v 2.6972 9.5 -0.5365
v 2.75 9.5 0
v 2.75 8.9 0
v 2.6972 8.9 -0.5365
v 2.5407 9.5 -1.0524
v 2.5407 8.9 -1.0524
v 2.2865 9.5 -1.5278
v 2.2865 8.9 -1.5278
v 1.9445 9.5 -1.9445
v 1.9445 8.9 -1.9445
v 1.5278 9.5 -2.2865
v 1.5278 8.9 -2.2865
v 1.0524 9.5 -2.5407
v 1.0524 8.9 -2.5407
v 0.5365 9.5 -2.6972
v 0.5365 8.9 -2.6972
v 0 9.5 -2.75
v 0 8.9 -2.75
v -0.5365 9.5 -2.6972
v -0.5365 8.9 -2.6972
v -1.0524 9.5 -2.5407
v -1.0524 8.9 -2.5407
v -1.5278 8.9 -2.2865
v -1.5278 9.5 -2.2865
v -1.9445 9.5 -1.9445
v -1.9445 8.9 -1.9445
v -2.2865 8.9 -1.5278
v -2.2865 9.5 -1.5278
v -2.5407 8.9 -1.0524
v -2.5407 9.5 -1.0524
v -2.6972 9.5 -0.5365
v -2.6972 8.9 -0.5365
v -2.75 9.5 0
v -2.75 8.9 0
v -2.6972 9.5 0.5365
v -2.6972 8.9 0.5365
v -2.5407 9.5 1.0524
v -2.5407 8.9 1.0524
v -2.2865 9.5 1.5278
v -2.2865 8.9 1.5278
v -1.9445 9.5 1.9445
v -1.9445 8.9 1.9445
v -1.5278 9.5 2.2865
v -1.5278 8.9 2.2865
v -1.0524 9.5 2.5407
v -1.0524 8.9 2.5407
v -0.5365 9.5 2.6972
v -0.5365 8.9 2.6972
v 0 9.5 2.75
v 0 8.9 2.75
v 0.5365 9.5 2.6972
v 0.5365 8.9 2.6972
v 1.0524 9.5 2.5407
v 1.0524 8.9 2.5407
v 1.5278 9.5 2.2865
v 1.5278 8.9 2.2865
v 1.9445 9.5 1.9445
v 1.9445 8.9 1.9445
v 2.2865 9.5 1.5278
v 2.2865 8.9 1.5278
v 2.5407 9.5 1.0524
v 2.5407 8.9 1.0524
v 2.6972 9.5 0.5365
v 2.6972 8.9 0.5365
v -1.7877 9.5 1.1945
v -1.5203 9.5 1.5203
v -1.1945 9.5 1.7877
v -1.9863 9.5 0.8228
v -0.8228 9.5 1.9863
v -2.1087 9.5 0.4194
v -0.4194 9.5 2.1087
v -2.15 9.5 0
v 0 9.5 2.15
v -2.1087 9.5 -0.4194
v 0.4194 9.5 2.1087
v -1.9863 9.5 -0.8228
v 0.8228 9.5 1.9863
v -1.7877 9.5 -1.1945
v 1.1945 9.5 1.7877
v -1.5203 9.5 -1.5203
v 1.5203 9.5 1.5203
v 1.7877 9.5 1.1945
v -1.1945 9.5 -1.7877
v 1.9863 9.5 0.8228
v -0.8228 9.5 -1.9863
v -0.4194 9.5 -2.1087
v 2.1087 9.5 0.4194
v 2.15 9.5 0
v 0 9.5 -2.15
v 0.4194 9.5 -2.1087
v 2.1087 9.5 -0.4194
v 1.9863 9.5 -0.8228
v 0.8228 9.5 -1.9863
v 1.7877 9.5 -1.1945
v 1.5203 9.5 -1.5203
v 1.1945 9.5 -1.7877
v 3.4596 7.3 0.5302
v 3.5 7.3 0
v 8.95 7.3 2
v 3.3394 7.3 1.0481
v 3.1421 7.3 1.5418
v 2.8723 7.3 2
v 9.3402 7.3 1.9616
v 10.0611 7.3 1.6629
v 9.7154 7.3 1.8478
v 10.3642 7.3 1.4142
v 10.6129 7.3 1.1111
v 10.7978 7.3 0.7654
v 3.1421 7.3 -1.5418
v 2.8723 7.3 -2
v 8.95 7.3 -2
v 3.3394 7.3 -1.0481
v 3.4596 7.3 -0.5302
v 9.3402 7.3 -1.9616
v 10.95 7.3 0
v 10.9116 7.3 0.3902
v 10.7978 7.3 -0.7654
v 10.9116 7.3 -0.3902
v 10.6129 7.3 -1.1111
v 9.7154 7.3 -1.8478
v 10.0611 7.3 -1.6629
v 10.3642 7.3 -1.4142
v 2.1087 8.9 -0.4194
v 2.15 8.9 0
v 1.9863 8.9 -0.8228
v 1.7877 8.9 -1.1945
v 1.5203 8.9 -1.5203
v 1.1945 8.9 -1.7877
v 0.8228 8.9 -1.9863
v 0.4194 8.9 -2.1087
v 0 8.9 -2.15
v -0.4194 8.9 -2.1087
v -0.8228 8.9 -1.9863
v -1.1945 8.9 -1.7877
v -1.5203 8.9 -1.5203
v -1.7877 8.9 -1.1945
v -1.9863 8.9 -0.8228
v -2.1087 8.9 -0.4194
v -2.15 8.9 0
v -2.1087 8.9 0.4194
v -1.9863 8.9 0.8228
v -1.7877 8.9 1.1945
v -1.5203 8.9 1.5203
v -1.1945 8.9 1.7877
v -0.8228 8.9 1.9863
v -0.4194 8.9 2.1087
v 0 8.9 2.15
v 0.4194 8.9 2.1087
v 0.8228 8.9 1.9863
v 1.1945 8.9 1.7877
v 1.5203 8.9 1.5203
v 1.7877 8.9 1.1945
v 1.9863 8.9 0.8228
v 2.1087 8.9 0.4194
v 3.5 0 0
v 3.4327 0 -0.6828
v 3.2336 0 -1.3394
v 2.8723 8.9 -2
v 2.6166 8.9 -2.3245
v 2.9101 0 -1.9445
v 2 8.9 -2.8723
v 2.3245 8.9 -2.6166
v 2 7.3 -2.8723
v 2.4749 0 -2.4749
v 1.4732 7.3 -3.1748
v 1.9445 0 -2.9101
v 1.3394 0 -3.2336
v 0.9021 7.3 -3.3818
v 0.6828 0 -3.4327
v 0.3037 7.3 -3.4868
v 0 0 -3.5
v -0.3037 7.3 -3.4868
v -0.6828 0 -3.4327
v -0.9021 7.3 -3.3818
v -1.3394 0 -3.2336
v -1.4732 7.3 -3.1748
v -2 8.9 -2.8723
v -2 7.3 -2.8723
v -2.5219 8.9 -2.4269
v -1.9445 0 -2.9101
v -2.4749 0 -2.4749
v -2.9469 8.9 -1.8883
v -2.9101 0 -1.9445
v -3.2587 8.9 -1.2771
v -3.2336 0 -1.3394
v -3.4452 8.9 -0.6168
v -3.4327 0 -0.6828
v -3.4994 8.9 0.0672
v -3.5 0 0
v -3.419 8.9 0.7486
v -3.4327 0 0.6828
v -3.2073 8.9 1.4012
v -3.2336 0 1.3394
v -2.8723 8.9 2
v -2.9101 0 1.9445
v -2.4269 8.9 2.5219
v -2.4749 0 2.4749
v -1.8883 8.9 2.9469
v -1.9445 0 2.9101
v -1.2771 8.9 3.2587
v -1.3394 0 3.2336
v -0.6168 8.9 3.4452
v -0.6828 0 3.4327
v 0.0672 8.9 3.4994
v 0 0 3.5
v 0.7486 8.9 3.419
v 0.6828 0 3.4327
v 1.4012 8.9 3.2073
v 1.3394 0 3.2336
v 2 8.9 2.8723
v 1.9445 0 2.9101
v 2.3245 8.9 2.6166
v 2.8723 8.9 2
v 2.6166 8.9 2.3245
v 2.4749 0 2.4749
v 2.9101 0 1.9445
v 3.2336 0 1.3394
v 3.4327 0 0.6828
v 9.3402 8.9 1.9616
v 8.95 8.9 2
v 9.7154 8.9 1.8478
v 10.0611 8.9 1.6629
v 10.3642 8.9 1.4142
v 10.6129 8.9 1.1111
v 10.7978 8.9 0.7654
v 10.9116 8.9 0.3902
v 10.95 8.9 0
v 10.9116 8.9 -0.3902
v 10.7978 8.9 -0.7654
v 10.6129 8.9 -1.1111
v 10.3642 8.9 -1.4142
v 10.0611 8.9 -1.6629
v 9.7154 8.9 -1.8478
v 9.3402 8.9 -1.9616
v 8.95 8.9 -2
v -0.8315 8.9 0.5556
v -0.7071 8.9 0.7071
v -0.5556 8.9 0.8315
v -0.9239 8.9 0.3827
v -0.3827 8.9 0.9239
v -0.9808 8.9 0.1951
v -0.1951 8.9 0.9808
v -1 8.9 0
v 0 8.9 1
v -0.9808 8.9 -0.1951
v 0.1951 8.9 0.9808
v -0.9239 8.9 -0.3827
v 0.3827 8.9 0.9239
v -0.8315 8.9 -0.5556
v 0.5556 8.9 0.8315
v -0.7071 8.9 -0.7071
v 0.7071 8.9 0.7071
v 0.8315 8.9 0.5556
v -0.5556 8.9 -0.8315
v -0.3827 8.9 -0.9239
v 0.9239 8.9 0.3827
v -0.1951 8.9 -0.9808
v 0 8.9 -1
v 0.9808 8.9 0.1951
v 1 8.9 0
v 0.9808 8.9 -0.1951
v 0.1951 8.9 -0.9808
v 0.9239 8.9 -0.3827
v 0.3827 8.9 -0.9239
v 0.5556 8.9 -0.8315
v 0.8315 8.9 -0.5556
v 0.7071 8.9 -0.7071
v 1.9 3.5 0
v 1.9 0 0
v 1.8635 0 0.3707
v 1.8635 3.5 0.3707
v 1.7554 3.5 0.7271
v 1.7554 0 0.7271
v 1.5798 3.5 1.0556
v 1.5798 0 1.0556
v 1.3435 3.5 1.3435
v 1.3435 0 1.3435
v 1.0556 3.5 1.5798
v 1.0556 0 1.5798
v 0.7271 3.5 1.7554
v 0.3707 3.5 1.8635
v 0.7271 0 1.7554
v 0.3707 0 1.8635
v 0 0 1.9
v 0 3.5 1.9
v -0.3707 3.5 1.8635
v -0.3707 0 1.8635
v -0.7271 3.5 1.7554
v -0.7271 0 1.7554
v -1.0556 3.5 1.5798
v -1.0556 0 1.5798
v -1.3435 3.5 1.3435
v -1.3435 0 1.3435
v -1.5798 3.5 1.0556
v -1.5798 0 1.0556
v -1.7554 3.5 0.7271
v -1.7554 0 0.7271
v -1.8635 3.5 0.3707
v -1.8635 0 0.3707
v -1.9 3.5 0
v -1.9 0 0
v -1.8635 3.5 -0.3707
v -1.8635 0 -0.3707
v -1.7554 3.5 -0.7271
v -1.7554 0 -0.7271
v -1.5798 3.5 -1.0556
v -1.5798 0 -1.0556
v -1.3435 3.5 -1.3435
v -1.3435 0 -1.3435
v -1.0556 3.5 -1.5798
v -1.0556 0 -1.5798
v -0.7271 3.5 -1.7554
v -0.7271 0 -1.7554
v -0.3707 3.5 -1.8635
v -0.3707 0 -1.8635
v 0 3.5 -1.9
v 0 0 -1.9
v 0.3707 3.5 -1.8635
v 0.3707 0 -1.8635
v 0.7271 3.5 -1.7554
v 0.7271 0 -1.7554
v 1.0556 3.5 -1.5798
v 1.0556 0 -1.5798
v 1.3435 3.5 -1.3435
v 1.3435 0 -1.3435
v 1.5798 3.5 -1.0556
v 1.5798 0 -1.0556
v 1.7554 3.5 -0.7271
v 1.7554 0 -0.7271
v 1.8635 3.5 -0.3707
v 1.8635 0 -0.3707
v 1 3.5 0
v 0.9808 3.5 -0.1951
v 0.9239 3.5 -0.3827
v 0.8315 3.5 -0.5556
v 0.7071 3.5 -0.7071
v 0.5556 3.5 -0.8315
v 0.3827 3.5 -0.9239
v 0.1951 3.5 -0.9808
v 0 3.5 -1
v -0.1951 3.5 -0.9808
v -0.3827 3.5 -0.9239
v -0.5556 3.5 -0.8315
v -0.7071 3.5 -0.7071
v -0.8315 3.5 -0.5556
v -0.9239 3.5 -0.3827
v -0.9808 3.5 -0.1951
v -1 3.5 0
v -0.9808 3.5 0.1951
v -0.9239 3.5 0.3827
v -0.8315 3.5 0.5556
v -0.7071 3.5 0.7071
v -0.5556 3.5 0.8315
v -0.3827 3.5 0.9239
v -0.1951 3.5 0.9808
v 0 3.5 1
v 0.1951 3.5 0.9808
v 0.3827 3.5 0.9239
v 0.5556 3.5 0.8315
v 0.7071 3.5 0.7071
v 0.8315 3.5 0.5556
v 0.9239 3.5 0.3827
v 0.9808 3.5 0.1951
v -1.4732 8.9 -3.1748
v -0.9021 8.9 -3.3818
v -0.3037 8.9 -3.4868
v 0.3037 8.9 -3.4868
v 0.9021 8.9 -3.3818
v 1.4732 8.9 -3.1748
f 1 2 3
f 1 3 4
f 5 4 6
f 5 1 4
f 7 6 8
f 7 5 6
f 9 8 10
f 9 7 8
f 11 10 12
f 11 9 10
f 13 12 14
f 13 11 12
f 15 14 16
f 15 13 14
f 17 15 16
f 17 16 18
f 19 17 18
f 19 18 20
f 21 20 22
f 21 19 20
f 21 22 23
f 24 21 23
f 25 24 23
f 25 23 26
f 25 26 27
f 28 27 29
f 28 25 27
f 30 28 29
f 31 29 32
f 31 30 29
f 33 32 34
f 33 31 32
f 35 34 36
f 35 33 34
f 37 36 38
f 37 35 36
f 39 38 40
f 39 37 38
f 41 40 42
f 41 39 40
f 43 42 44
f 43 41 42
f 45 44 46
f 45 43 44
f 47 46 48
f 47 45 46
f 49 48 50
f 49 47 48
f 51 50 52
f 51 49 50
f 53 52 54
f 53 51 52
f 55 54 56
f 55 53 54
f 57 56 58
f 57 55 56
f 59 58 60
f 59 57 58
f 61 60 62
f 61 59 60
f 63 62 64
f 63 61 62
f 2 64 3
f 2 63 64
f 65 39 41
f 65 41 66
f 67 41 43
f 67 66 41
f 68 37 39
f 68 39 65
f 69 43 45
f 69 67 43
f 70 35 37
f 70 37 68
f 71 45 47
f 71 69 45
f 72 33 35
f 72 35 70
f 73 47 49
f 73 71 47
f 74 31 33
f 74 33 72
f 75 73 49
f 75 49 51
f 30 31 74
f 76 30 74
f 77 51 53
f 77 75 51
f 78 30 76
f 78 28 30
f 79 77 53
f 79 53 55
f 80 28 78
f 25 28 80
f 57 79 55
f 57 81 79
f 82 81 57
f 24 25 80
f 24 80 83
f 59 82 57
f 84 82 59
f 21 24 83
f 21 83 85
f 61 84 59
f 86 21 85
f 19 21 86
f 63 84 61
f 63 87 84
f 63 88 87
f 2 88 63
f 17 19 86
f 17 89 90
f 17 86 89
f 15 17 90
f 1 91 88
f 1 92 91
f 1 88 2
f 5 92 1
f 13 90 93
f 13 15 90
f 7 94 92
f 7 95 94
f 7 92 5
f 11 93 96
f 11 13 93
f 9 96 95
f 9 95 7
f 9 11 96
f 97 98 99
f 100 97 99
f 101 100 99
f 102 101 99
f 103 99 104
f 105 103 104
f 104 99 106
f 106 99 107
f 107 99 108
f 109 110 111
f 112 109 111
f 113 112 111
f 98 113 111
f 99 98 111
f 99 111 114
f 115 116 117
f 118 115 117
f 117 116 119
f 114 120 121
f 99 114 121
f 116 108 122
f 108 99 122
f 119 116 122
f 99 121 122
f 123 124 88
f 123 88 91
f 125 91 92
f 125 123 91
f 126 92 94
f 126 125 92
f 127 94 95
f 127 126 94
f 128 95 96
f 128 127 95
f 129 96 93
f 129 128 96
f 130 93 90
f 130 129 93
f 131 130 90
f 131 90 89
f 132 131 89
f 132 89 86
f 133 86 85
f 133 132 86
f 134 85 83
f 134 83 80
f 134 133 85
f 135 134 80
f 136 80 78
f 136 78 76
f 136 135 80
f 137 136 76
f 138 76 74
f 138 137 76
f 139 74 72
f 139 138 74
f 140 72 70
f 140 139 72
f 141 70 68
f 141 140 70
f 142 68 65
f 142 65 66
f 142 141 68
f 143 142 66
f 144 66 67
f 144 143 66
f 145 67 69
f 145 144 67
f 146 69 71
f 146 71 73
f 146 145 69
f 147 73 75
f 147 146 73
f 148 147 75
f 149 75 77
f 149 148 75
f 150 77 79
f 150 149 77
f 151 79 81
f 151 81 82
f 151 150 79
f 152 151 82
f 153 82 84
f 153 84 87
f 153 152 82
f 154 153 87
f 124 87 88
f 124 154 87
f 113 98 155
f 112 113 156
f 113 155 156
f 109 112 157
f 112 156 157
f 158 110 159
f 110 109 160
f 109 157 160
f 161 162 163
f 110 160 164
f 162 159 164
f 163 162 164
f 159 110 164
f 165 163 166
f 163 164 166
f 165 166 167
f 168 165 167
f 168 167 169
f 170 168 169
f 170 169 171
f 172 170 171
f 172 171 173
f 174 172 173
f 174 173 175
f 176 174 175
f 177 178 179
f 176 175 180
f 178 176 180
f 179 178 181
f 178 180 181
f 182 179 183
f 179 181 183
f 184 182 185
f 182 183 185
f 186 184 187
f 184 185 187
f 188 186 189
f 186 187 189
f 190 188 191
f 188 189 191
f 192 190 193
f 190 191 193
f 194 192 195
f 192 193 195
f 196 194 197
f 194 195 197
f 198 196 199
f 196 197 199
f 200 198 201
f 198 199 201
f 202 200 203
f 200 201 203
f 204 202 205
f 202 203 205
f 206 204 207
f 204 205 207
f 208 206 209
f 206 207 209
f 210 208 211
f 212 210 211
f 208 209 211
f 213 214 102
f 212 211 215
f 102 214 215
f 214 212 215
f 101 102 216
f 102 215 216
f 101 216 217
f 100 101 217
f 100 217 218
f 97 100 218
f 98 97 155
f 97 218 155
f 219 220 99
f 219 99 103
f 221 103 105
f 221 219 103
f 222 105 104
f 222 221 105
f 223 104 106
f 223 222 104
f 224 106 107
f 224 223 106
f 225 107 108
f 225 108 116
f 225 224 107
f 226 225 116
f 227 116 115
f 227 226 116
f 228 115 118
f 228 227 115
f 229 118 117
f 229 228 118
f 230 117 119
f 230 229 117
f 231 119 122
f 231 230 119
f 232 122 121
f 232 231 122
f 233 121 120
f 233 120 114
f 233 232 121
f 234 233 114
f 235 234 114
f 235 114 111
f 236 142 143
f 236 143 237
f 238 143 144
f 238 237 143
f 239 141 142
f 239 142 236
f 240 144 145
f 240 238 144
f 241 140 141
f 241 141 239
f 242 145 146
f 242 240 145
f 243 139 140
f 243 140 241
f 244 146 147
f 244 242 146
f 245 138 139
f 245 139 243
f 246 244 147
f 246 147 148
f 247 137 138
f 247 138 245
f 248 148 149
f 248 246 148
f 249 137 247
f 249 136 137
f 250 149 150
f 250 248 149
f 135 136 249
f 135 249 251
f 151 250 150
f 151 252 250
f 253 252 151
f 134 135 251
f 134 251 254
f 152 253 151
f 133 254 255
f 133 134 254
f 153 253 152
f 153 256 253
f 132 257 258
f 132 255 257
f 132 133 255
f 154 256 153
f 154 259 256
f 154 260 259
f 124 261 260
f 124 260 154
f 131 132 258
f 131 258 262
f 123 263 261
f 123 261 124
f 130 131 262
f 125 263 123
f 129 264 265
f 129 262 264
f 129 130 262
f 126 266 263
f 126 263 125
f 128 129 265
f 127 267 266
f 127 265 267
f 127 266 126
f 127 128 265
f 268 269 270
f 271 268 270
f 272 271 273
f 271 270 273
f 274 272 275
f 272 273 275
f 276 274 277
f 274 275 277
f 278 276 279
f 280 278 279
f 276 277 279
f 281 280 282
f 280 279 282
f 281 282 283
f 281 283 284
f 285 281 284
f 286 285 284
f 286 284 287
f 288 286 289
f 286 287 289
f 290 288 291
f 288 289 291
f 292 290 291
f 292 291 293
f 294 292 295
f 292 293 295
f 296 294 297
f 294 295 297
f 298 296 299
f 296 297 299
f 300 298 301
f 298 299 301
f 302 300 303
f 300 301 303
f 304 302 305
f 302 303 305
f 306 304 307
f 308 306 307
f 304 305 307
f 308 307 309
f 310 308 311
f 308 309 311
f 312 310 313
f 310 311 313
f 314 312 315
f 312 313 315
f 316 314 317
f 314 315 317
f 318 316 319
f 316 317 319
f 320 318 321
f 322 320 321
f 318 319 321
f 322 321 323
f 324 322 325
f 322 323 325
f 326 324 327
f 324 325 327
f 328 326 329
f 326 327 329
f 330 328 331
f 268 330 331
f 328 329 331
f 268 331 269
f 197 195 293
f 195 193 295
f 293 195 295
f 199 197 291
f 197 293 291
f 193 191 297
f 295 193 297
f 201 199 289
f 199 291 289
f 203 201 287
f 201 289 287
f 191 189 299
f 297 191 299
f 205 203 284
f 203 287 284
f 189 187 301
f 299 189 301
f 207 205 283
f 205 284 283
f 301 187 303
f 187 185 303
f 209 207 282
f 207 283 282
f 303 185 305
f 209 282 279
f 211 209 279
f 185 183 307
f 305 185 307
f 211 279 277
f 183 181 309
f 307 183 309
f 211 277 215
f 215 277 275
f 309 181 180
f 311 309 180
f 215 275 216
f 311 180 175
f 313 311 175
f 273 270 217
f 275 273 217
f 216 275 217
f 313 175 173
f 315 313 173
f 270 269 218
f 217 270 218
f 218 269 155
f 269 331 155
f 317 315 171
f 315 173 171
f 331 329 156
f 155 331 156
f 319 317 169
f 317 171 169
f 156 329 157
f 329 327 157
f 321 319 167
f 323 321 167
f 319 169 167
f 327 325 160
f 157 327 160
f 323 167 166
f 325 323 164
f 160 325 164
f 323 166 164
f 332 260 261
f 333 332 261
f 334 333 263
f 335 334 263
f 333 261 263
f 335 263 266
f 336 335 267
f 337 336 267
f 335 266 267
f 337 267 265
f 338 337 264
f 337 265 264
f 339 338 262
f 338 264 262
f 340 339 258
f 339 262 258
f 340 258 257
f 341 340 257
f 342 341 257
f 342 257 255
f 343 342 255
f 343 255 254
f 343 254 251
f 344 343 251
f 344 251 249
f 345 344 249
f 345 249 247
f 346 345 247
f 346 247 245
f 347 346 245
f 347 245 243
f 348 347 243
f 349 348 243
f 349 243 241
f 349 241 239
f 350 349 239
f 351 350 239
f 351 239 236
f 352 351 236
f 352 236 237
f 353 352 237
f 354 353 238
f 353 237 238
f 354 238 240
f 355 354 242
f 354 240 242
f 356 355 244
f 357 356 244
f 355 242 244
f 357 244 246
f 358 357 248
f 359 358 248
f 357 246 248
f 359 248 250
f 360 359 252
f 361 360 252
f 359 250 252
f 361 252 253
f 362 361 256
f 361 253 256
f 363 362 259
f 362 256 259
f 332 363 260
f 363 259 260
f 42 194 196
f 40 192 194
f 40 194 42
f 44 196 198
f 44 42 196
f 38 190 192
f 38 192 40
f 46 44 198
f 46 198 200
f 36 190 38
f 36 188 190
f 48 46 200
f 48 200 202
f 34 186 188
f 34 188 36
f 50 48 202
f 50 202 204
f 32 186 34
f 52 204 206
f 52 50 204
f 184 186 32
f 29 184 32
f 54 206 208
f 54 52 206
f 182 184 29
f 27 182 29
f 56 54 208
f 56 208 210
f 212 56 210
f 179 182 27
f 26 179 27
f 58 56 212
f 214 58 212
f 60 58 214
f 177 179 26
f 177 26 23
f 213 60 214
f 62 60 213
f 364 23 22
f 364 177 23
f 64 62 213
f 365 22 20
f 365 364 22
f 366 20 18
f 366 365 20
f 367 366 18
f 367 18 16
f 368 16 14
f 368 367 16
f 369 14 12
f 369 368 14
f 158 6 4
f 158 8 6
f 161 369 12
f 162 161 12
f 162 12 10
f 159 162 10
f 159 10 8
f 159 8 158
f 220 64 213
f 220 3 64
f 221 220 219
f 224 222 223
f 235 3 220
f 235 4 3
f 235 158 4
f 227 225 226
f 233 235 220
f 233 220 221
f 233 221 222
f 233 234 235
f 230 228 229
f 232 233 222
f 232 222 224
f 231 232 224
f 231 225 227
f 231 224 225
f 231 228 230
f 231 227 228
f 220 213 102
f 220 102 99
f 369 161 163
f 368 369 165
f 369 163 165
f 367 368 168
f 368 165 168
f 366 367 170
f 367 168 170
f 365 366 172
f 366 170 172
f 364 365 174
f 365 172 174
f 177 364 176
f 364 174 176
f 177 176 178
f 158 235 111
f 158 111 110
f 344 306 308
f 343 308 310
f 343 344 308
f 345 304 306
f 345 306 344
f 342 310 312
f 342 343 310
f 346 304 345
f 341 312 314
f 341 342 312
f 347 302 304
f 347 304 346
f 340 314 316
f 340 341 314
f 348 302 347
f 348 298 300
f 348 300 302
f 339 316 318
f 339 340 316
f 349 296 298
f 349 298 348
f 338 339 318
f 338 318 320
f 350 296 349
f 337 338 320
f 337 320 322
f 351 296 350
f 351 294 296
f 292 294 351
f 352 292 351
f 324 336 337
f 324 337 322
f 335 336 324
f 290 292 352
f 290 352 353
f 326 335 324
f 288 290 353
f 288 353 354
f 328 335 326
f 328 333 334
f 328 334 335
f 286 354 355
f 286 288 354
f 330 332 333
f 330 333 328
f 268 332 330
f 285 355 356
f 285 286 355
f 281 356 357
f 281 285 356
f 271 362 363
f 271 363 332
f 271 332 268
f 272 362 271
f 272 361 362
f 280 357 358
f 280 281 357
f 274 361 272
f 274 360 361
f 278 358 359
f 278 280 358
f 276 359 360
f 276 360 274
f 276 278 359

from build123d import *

# Parameters (mm, degrees)
SZKIC1_R                    = 3.5
DODANIE_WYCI_GNI_CIE1_DEPTH = 9.5
SZKIC2_R                    = 1.9
WYTNIJ_WYCI_GNI_CIE1_DEPTH  = 3.5
SZKIC3_R                    = 2
DODANIE_WYCI_GNI_CIE2_DEPTH = 1.6
WYTNIJ_WYCI_GNI_CIE2_START  = -0.6
SZKIC4_R                    = 2.15
WYTNIJ_WYCI_GNI_CIE2_DEPTH  = 0.6
SZKIC5_R                    = 1
WYTNIJ_WYCI_GNI_CIE3_DEPTH  = 31.6
SZKIC6_R                    = 3.5
SZKIC6_R_2                  = 2.75
WYTNIJ_WYCI_GNI_CIE4_DEPTH  = 0.6
WYTNIJ_WYCI_GNI_CIE5_DEPTH  = 10


with BuildPart() as part:
    # Szkic1 → Dodanie-wyciągnięcie1 (new body)
    with BuildSketch(Plane(origin=(0, 0, 0), x_dir=(1, 0, 0), z_dir=(0, 1, 0))):
        Circle(SZKIC1_R)
    extrude(amount=DODANIE_WYCI_GNI_CIE1_DEPTH)

    # Szkic2 → Wytnij-wyciągnięcie1 (cut)
    with BuildSketch(Plane.XZ):
        Circle(SZKIC2_R)
    extrude(amount=-WYTNIJ_WYCI_GNI_CIE1_DEPTH, mode=Mode.SUBTRACT)

    # Szkic3 → Dodanie-wyciągnięcie2 (add)
    with BuildSketch(Plane(origin=(0, 8.9, 0), x_dir=(1, 0, 0), z_dir=(0, 1, 0))):
        with Locations((-8.95, 0)):
            Circle(SZKIC3_R)
        with BuildLine():
            Line((-2, 2), (-8.95, 2))
            ThreePointArc((-8.95, 2), (-7.535786438, 1.414213562), (-6.95, 0))
            ThreePointArc((-6.95, 0), (-7.535786438, -1.414213562), (-8.95, -2))
            Line((-8.95, -2), (-2, -2))
            Line((-2, -2), (-2, 2))
        make_face()
        with Locations((0, 7)):
            Circle(SZKIC3_R)
        with BuildLine():
            Line((-2, 7), (-2, 2))
            Line((-2, 2), (0, 2))
            Line((0, 2), (2, 2))
            Line((2, 2), (2, 7))
            ThreePointArc((2, 7), (0, 5), (-2, 7))
        make_face()
        with BuildLine():
            Line((8.95, 2), (2, 2))
            Line((2, 2), (2, 0))
            Line((2, 0), (2, -2))
            Line((2, -2), (8.95, -2))
            ThreePointArc((8.95, -2), (6.95, 0), (8.95, 2))
        make_face()
        with Locations((8.95, 0)):
            Circle(SZKIC3_R)
        with Locations((0, -7)):
            Circle(SZKIC3_R)
        with BuildLine():
            Line((2, -2), (-2, -2))
            Line((-2, -2), (-2, -7))
            ThreePointArc((-2, -7), (0, -5), (2, -7))
            Line((2, -7), (2, -2))
        make_face()
    extrude(amount=-DODANIE_WYCI_GNI_CIE2_DEPTH)

    # Szkic4 → Wytnij-wyciągnięcie2 (cut)
    with BuildSketch(Plane(origin=(0, 9.5, 0), x_dir=(1, 0, 0), z_dir=(0, 1, 0)).offset(WYTNIJ_WYCI_GNI_CIE2_START)):
        Circle(SZKIC4_R)
    extrude(amount=WYTNIJ_WYCI_GNI_CIE2_DEPTH, mode=Mode.SUBTRACT)

    # Szkic5 → Wytnij-wyciągnięcie3 (cut)
    with BuildSketch(Plane(origin=(0, 8.9, 0), x_dir=(1, 0, 0), z_dir=(0, 1, 0))):
        Circle(SZKIC5_R)
    extrude(amount=-WYTNIJ_WYCI_GNI_CIE3_DEPTH, mode=Mode.SUBTRACT)

    # Szkic6 → Wytnij-wyciągnięcie4 (cut)
    with BuildSketch(Plane(origin=(0, 9.5, 0), x_dir=(1, 0, 0), z_dir=(0, 1, 0))):
        Circle(SZKIC6_R)
        Circle(SZKIC6_R_2, mode=Mode.SUBTRACT)
    extrude(amount=-WYTNIJ_WYCI_GNI_CIE4_DEPTH, mode=Mode.SUBTRACT)

    # Szkic7 → Wytnij-wyciągnięcie5 (cut)
    with BuildSketch(Plane.XZ.offset(-7.3)):
        with BuildLine():
            ThreePointArc((-2, -7), (0, -9), (2, -7))
            Line((2, -7), (2, -2.872281323))
            ThreePointArc((2, -2.872281323), (0, -3.5), (-2, -2.872281323))
            Line((-2, -2.872281323), (-2, -7))
        make_face()
        with BuildLine():
            Line((2, -11.805294156), (2, -7))
            ThreePointArc((2, -7), (0, -9), (-2, -7))
            Line((-2, -7), (-2, -2.872281323))
            ThreePointArc((-2, -2.872281323), (-2.872281323, 2), (2, 2.872281323))
            Line((2, 2.872281323), (2, 7))
            Line((2, 7), (2, 11.668395205))
            Line((2, 11.668395205), (-21.006020829, 11.668395205))
            Line((-21.006020829, 11.668395205), (-21.006020829, -11.805294156))
            Line((-21.006020829, -11.805294156), (2, -11.805294156))
        make_face()
    extrude(amount=-WYTNIJ_WYCI_GNI_CIE5_DEPTH, mode=Mode.SUBTRACT)


solid = part.part
